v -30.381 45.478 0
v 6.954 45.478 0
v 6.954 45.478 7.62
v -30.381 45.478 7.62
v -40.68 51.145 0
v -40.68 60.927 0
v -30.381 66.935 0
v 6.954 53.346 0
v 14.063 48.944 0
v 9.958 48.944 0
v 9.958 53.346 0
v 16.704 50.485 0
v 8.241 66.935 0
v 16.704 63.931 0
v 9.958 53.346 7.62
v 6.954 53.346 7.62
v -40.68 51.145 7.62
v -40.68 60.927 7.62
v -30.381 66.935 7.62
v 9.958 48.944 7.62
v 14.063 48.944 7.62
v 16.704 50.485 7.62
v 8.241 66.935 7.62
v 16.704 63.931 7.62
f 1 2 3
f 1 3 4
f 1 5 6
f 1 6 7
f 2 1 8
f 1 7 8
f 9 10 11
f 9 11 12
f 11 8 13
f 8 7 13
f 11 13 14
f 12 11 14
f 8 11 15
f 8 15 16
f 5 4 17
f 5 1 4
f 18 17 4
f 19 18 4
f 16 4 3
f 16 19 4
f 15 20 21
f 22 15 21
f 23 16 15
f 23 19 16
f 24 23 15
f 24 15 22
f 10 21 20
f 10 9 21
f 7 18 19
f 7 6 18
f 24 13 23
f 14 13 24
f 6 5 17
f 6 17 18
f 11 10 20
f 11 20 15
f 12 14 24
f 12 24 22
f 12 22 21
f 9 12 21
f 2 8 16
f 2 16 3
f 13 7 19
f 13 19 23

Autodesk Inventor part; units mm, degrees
ref_plane "YZ Plane" through (0, 0, 0) normal (1, 0, 0) x (0, 1, 0)
ref_plane "XZ Plane" through (0, 0, 0) normal (0, 1, 0) x (-1, 0, 0)
ref_plane "XY Plane" through (0, 0, 0) normal (0, 0, 1) x (1, 0, 0)
sketch "Sketch1" plane through (0, 0, 0) normal (0, 0, 1) x (1, 0, 0)
  line L0 (-91.2456, 87.8277) -> (124.6544, 87.8277) construction
  line L1 (124.6544, 87.8277) -> (124.6544, -191.7916) construction
  line L2 (124.6544, -191.7916) -> (-91.2456, -191.7916) construction
  line L3 (-91.2456, -191.7916) -> (-91.2456, 87.8277) construction
  line L4 (-40.6804, 60.9272) -> (-30.3811, 66.9352)
  line L5 (-30.3811, 66.9352) -> (8.2414, 66.9352)
  line L6 (8.2414, 66.9352) -> (16.7044, 63.9312)
  line L7 (16.7044, 63.9312) -> (16.7044, 50.4848)
  line L8 (16.7044, 50.4848) -> (14.0633, 48.9442)
  line L9 (14.0633, 48.9442) -> (9.958, 48.9442)
  line L10 (9.958, 48.9442) -> (9.958, 53.3458)
  line L11 (9.958, 53.3458) -> (6.954, 53.3458)
  line L12 (6.954, 53.3458) -> (6.954, 45.4782)
  line L13 (6.954, 45.4782) -> (-30.3811, 45.4782)
  line L14 (-40.6804, 51.145) -> (-40.6804, 60.9272)
  line L15 (-30.3811, 45.4782) -> (-40.6804, 51.145)
  point P0 (0, 0)
  dimension "d4" = 215.9
extrude "Extrusion1" add sketch "Sketch1" along normal blind 7.62
properties part number "flatcamera"
